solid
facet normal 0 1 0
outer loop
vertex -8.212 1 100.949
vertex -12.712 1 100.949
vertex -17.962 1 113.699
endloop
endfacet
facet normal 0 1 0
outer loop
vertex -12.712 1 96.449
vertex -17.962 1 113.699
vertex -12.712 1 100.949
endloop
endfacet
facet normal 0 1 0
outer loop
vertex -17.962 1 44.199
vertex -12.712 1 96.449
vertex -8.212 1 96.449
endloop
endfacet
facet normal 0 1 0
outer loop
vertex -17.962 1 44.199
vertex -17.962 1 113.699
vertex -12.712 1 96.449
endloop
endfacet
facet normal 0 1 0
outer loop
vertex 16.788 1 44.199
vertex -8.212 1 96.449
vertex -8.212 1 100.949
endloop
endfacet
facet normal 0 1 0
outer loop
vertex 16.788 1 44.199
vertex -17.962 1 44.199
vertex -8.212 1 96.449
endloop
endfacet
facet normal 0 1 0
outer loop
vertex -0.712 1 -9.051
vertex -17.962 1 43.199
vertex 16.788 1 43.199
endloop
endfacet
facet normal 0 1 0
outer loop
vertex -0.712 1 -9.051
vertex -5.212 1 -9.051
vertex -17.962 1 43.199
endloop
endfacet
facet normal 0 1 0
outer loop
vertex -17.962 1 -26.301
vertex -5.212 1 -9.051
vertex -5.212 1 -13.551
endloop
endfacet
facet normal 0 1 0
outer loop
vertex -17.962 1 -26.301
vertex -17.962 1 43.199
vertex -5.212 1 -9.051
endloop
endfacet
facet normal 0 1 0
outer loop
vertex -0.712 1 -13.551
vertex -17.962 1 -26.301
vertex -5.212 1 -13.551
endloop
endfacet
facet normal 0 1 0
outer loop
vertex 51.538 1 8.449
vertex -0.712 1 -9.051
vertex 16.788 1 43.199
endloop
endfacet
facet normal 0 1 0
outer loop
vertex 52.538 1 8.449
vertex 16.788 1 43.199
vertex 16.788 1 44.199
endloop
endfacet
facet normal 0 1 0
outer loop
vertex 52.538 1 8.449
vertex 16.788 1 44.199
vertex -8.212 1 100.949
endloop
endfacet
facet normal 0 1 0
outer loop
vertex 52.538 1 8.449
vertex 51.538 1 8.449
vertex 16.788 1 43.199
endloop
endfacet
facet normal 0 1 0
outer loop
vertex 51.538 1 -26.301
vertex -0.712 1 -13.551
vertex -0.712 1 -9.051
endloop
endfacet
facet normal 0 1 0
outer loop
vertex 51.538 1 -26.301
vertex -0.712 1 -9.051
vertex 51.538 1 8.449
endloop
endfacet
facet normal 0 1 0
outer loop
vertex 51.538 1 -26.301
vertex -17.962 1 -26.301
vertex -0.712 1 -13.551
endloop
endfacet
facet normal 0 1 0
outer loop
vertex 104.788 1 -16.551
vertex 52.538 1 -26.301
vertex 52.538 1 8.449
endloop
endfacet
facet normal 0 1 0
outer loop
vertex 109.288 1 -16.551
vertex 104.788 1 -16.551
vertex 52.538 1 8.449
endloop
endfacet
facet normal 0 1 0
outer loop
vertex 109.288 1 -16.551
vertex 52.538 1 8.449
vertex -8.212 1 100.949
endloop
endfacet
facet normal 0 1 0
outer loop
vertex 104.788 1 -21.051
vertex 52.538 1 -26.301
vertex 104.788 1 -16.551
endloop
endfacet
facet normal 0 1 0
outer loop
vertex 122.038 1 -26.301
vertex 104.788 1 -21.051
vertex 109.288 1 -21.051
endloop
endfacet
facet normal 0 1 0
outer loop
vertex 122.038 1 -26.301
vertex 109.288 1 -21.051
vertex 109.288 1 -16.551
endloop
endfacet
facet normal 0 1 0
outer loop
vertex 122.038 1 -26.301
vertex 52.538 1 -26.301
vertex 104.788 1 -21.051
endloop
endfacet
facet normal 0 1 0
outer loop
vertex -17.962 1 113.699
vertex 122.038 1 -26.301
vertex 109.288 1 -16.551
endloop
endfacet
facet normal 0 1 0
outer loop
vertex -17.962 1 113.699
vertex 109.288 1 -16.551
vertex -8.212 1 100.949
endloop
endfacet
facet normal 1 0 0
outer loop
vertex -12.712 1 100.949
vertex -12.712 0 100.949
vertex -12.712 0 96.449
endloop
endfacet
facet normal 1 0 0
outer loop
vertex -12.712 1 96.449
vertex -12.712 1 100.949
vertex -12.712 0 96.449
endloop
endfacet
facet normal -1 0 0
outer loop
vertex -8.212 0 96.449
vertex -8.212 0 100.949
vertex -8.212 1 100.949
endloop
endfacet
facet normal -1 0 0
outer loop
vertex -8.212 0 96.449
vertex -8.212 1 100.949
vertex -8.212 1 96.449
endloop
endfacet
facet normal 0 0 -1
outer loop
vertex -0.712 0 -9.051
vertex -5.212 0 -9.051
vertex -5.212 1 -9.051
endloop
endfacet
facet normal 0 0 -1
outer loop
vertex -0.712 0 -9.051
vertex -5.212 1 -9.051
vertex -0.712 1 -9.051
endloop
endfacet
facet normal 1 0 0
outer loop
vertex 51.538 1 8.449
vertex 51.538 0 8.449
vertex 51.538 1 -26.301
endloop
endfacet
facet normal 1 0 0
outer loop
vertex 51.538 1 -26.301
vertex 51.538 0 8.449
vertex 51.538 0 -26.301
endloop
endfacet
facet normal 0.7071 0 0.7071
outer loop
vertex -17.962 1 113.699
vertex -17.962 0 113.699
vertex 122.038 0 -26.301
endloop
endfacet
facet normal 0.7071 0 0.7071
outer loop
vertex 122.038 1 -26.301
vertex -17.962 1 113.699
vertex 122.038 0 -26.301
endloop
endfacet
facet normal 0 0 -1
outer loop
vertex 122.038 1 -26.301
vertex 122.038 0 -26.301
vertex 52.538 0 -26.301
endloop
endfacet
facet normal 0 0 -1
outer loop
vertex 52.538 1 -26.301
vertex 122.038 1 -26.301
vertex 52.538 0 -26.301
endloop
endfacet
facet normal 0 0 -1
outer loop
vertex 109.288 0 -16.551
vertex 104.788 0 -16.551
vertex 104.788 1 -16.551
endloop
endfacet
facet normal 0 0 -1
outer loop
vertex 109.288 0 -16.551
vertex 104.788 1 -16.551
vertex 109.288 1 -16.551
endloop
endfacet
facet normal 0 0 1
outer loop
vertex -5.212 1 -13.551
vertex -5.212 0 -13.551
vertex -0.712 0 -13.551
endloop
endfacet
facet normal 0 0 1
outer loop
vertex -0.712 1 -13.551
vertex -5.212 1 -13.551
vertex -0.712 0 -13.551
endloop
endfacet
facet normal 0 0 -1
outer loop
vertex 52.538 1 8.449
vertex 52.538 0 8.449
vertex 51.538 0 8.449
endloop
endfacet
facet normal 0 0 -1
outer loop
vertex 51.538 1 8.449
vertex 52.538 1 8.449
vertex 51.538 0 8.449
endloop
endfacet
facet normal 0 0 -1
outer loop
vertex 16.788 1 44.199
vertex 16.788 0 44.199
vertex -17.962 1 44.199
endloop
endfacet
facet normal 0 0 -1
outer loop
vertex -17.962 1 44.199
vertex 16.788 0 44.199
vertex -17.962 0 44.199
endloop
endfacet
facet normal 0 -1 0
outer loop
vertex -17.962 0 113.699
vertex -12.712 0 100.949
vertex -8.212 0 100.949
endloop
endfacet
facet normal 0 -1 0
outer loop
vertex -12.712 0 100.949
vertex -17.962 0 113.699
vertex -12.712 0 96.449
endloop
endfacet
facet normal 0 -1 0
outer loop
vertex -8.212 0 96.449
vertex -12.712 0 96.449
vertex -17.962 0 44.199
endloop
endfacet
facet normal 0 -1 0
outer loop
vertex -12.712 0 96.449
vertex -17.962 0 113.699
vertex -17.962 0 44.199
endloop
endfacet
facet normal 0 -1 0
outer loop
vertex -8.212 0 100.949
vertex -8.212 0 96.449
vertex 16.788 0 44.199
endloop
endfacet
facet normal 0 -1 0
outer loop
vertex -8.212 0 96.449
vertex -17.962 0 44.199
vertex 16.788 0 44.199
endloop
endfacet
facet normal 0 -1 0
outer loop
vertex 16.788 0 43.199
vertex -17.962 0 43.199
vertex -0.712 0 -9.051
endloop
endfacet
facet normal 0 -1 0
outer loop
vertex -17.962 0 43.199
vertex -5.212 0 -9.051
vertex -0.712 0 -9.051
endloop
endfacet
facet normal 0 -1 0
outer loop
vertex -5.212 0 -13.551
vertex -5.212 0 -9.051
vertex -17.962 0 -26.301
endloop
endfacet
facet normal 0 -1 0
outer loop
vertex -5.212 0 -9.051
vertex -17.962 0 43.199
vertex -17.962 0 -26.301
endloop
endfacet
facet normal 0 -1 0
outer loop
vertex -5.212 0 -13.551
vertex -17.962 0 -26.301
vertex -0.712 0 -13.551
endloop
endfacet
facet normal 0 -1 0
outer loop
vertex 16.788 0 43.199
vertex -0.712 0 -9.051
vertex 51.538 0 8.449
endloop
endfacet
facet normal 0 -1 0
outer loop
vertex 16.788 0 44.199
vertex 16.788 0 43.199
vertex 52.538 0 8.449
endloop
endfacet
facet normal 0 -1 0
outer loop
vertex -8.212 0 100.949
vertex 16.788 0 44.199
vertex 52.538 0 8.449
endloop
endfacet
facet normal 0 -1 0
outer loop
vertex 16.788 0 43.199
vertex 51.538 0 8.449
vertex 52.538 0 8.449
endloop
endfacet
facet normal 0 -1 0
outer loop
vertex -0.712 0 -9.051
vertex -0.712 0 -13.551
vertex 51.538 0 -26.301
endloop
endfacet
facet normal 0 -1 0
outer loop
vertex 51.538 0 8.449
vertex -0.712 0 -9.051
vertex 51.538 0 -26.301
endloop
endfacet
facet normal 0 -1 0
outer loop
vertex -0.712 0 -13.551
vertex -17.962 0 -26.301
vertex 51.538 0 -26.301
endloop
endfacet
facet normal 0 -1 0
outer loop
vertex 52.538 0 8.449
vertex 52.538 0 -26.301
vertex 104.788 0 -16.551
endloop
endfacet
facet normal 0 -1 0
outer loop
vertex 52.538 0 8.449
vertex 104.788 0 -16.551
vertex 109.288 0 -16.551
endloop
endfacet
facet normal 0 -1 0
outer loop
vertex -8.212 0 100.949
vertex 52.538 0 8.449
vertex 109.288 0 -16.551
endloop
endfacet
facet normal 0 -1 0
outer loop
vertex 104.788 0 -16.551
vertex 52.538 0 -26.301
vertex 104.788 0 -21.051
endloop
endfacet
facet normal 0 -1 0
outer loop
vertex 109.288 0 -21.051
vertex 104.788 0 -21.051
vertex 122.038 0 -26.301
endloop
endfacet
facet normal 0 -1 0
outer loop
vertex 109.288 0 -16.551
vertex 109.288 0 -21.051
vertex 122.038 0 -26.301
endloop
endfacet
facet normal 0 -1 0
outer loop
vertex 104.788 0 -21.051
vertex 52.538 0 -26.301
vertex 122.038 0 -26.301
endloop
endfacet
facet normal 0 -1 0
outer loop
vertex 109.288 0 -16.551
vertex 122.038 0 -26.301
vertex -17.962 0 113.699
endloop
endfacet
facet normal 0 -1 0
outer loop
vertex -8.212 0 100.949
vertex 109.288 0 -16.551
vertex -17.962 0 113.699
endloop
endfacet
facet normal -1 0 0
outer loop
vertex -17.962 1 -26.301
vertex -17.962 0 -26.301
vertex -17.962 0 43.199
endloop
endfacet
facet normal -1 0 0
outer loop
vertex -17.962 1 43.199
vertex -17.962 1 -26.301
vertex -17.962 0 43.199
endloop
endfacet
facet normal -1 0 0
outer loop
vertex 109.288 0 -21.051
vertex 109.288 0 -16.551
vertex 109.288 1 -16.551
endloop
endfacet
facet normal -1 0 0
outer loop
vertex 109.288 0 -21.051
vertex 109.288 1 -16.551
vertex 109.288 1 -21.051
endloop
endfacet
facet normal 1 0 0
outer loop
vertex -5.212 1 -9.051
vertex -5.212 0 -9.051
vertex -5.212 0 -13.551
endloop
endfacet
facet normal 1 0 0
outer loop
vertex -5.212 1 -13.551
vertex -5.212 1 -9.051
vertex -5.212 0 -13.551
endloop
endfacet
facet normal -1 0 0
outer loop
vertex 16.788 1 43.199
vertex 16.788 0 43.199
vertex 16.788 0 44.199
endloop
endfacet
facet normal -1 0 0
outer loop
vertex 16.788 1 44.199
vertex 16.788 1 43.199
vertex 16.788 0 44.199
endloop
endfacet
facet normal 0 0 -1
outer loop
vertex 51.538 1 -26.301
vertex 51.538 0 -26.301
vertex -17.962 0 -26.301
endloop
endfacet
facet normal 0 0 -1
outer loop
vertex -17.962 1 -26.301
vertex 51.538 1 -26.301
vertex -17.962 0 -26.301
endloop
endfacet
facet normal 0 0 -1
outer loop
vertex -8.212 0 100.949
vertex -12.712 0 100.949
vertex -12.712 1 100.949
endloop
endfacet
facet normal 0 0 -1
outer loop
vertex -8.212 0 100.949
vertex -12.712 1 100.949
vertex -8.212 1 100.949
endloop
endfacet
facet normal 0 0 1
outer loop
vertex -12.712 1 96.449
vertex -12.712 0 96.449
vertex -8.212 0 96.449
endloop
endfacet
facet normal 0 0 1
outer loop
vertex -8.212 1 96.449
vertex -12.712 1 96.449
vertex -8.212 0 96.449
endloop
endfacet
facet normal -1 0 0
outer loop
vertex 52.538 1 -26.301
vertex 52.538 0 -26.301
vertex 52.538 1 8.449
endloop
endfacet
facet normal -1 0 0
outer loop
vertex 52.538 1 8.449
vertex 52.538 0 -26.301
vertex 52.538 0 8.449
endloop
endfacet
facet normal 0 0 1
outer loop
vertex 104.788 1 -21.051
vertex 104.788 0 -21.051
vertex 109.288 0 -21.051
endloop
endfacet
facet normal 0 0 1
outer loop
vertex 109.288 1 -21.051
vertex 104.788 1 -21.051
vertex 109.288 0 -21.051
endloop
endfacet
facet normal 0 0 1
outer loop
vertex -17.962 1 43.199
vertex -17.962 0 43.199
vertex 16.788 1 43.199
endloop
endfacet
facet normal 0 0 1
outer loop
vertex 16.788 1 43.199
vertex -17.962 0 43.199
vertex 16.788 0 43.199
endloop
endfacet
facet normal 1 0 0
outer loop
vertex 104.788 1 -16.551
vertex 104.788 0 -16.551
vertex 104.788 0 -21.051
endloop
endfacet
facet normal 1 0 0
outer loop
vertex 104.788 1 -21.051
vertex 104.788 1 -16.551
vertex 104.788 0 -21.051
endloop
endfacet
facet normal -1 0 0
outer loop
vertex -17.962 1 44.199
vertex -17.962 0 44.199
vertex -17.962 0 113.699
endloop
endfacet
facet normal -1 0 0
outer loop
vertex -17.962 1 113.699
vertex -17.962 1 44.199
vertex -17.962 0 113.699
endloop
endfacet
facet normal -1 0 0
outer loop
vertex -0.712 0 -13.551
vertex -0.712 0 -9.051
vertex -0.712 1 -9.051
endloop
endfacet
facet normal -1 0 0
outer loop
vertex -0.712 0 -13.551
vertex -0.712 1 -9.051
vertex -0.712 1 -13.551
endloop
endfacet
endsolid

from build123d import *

# Parameters (mm, degrees)
SKETCH1_W           = 4.5
SKETCH1_H           = 4.5
BOSS_EXTRUDE3_DEPTH = 1


with BuildPart() as part:
    # Sketch1 → Boss-Extrude3 (new body)
    with BuildSketch(Plane(origin=(0, 0, 0), x_dir=(1, 0, 0), z_dir=(0, 1, 0))):
        Polygon((122.038308787, 26.301002263), (52.538308787, 26.301002263), (52.538308787, -8.448997737), (51.538308787, -8.448997737), (51.538308787, 26.301002263), (-17.961691213, 26.301002263), (-17.961691213, -43.198997737), (16.788308787, -43.198997737), (16.788308787, -44.198997737), (-17.961691213, -44.198997737), (-17.961691213, -113.698997737), align=None)
        with Locations((-2.961691213, 11.301002263)):
            Rectangle(SKETCH1_W, SKETCH1_H, mode=Mode.SUBTRACT)
        with Locations((107.038308787, 18.801002263)):
            Rectangle(SKETCH1_W, SKETCH1_H, mode=Mode.SUBTRACT)
        with Locations((-10.461691213, -98.698997737)):
            Rectangle(SKETCH1_W, SKETCH1_H, mode=Mode.SUBTRACT)
    extrude(amount=BOSS_EXTRUDE3_DEPTH)


solid = part.part
